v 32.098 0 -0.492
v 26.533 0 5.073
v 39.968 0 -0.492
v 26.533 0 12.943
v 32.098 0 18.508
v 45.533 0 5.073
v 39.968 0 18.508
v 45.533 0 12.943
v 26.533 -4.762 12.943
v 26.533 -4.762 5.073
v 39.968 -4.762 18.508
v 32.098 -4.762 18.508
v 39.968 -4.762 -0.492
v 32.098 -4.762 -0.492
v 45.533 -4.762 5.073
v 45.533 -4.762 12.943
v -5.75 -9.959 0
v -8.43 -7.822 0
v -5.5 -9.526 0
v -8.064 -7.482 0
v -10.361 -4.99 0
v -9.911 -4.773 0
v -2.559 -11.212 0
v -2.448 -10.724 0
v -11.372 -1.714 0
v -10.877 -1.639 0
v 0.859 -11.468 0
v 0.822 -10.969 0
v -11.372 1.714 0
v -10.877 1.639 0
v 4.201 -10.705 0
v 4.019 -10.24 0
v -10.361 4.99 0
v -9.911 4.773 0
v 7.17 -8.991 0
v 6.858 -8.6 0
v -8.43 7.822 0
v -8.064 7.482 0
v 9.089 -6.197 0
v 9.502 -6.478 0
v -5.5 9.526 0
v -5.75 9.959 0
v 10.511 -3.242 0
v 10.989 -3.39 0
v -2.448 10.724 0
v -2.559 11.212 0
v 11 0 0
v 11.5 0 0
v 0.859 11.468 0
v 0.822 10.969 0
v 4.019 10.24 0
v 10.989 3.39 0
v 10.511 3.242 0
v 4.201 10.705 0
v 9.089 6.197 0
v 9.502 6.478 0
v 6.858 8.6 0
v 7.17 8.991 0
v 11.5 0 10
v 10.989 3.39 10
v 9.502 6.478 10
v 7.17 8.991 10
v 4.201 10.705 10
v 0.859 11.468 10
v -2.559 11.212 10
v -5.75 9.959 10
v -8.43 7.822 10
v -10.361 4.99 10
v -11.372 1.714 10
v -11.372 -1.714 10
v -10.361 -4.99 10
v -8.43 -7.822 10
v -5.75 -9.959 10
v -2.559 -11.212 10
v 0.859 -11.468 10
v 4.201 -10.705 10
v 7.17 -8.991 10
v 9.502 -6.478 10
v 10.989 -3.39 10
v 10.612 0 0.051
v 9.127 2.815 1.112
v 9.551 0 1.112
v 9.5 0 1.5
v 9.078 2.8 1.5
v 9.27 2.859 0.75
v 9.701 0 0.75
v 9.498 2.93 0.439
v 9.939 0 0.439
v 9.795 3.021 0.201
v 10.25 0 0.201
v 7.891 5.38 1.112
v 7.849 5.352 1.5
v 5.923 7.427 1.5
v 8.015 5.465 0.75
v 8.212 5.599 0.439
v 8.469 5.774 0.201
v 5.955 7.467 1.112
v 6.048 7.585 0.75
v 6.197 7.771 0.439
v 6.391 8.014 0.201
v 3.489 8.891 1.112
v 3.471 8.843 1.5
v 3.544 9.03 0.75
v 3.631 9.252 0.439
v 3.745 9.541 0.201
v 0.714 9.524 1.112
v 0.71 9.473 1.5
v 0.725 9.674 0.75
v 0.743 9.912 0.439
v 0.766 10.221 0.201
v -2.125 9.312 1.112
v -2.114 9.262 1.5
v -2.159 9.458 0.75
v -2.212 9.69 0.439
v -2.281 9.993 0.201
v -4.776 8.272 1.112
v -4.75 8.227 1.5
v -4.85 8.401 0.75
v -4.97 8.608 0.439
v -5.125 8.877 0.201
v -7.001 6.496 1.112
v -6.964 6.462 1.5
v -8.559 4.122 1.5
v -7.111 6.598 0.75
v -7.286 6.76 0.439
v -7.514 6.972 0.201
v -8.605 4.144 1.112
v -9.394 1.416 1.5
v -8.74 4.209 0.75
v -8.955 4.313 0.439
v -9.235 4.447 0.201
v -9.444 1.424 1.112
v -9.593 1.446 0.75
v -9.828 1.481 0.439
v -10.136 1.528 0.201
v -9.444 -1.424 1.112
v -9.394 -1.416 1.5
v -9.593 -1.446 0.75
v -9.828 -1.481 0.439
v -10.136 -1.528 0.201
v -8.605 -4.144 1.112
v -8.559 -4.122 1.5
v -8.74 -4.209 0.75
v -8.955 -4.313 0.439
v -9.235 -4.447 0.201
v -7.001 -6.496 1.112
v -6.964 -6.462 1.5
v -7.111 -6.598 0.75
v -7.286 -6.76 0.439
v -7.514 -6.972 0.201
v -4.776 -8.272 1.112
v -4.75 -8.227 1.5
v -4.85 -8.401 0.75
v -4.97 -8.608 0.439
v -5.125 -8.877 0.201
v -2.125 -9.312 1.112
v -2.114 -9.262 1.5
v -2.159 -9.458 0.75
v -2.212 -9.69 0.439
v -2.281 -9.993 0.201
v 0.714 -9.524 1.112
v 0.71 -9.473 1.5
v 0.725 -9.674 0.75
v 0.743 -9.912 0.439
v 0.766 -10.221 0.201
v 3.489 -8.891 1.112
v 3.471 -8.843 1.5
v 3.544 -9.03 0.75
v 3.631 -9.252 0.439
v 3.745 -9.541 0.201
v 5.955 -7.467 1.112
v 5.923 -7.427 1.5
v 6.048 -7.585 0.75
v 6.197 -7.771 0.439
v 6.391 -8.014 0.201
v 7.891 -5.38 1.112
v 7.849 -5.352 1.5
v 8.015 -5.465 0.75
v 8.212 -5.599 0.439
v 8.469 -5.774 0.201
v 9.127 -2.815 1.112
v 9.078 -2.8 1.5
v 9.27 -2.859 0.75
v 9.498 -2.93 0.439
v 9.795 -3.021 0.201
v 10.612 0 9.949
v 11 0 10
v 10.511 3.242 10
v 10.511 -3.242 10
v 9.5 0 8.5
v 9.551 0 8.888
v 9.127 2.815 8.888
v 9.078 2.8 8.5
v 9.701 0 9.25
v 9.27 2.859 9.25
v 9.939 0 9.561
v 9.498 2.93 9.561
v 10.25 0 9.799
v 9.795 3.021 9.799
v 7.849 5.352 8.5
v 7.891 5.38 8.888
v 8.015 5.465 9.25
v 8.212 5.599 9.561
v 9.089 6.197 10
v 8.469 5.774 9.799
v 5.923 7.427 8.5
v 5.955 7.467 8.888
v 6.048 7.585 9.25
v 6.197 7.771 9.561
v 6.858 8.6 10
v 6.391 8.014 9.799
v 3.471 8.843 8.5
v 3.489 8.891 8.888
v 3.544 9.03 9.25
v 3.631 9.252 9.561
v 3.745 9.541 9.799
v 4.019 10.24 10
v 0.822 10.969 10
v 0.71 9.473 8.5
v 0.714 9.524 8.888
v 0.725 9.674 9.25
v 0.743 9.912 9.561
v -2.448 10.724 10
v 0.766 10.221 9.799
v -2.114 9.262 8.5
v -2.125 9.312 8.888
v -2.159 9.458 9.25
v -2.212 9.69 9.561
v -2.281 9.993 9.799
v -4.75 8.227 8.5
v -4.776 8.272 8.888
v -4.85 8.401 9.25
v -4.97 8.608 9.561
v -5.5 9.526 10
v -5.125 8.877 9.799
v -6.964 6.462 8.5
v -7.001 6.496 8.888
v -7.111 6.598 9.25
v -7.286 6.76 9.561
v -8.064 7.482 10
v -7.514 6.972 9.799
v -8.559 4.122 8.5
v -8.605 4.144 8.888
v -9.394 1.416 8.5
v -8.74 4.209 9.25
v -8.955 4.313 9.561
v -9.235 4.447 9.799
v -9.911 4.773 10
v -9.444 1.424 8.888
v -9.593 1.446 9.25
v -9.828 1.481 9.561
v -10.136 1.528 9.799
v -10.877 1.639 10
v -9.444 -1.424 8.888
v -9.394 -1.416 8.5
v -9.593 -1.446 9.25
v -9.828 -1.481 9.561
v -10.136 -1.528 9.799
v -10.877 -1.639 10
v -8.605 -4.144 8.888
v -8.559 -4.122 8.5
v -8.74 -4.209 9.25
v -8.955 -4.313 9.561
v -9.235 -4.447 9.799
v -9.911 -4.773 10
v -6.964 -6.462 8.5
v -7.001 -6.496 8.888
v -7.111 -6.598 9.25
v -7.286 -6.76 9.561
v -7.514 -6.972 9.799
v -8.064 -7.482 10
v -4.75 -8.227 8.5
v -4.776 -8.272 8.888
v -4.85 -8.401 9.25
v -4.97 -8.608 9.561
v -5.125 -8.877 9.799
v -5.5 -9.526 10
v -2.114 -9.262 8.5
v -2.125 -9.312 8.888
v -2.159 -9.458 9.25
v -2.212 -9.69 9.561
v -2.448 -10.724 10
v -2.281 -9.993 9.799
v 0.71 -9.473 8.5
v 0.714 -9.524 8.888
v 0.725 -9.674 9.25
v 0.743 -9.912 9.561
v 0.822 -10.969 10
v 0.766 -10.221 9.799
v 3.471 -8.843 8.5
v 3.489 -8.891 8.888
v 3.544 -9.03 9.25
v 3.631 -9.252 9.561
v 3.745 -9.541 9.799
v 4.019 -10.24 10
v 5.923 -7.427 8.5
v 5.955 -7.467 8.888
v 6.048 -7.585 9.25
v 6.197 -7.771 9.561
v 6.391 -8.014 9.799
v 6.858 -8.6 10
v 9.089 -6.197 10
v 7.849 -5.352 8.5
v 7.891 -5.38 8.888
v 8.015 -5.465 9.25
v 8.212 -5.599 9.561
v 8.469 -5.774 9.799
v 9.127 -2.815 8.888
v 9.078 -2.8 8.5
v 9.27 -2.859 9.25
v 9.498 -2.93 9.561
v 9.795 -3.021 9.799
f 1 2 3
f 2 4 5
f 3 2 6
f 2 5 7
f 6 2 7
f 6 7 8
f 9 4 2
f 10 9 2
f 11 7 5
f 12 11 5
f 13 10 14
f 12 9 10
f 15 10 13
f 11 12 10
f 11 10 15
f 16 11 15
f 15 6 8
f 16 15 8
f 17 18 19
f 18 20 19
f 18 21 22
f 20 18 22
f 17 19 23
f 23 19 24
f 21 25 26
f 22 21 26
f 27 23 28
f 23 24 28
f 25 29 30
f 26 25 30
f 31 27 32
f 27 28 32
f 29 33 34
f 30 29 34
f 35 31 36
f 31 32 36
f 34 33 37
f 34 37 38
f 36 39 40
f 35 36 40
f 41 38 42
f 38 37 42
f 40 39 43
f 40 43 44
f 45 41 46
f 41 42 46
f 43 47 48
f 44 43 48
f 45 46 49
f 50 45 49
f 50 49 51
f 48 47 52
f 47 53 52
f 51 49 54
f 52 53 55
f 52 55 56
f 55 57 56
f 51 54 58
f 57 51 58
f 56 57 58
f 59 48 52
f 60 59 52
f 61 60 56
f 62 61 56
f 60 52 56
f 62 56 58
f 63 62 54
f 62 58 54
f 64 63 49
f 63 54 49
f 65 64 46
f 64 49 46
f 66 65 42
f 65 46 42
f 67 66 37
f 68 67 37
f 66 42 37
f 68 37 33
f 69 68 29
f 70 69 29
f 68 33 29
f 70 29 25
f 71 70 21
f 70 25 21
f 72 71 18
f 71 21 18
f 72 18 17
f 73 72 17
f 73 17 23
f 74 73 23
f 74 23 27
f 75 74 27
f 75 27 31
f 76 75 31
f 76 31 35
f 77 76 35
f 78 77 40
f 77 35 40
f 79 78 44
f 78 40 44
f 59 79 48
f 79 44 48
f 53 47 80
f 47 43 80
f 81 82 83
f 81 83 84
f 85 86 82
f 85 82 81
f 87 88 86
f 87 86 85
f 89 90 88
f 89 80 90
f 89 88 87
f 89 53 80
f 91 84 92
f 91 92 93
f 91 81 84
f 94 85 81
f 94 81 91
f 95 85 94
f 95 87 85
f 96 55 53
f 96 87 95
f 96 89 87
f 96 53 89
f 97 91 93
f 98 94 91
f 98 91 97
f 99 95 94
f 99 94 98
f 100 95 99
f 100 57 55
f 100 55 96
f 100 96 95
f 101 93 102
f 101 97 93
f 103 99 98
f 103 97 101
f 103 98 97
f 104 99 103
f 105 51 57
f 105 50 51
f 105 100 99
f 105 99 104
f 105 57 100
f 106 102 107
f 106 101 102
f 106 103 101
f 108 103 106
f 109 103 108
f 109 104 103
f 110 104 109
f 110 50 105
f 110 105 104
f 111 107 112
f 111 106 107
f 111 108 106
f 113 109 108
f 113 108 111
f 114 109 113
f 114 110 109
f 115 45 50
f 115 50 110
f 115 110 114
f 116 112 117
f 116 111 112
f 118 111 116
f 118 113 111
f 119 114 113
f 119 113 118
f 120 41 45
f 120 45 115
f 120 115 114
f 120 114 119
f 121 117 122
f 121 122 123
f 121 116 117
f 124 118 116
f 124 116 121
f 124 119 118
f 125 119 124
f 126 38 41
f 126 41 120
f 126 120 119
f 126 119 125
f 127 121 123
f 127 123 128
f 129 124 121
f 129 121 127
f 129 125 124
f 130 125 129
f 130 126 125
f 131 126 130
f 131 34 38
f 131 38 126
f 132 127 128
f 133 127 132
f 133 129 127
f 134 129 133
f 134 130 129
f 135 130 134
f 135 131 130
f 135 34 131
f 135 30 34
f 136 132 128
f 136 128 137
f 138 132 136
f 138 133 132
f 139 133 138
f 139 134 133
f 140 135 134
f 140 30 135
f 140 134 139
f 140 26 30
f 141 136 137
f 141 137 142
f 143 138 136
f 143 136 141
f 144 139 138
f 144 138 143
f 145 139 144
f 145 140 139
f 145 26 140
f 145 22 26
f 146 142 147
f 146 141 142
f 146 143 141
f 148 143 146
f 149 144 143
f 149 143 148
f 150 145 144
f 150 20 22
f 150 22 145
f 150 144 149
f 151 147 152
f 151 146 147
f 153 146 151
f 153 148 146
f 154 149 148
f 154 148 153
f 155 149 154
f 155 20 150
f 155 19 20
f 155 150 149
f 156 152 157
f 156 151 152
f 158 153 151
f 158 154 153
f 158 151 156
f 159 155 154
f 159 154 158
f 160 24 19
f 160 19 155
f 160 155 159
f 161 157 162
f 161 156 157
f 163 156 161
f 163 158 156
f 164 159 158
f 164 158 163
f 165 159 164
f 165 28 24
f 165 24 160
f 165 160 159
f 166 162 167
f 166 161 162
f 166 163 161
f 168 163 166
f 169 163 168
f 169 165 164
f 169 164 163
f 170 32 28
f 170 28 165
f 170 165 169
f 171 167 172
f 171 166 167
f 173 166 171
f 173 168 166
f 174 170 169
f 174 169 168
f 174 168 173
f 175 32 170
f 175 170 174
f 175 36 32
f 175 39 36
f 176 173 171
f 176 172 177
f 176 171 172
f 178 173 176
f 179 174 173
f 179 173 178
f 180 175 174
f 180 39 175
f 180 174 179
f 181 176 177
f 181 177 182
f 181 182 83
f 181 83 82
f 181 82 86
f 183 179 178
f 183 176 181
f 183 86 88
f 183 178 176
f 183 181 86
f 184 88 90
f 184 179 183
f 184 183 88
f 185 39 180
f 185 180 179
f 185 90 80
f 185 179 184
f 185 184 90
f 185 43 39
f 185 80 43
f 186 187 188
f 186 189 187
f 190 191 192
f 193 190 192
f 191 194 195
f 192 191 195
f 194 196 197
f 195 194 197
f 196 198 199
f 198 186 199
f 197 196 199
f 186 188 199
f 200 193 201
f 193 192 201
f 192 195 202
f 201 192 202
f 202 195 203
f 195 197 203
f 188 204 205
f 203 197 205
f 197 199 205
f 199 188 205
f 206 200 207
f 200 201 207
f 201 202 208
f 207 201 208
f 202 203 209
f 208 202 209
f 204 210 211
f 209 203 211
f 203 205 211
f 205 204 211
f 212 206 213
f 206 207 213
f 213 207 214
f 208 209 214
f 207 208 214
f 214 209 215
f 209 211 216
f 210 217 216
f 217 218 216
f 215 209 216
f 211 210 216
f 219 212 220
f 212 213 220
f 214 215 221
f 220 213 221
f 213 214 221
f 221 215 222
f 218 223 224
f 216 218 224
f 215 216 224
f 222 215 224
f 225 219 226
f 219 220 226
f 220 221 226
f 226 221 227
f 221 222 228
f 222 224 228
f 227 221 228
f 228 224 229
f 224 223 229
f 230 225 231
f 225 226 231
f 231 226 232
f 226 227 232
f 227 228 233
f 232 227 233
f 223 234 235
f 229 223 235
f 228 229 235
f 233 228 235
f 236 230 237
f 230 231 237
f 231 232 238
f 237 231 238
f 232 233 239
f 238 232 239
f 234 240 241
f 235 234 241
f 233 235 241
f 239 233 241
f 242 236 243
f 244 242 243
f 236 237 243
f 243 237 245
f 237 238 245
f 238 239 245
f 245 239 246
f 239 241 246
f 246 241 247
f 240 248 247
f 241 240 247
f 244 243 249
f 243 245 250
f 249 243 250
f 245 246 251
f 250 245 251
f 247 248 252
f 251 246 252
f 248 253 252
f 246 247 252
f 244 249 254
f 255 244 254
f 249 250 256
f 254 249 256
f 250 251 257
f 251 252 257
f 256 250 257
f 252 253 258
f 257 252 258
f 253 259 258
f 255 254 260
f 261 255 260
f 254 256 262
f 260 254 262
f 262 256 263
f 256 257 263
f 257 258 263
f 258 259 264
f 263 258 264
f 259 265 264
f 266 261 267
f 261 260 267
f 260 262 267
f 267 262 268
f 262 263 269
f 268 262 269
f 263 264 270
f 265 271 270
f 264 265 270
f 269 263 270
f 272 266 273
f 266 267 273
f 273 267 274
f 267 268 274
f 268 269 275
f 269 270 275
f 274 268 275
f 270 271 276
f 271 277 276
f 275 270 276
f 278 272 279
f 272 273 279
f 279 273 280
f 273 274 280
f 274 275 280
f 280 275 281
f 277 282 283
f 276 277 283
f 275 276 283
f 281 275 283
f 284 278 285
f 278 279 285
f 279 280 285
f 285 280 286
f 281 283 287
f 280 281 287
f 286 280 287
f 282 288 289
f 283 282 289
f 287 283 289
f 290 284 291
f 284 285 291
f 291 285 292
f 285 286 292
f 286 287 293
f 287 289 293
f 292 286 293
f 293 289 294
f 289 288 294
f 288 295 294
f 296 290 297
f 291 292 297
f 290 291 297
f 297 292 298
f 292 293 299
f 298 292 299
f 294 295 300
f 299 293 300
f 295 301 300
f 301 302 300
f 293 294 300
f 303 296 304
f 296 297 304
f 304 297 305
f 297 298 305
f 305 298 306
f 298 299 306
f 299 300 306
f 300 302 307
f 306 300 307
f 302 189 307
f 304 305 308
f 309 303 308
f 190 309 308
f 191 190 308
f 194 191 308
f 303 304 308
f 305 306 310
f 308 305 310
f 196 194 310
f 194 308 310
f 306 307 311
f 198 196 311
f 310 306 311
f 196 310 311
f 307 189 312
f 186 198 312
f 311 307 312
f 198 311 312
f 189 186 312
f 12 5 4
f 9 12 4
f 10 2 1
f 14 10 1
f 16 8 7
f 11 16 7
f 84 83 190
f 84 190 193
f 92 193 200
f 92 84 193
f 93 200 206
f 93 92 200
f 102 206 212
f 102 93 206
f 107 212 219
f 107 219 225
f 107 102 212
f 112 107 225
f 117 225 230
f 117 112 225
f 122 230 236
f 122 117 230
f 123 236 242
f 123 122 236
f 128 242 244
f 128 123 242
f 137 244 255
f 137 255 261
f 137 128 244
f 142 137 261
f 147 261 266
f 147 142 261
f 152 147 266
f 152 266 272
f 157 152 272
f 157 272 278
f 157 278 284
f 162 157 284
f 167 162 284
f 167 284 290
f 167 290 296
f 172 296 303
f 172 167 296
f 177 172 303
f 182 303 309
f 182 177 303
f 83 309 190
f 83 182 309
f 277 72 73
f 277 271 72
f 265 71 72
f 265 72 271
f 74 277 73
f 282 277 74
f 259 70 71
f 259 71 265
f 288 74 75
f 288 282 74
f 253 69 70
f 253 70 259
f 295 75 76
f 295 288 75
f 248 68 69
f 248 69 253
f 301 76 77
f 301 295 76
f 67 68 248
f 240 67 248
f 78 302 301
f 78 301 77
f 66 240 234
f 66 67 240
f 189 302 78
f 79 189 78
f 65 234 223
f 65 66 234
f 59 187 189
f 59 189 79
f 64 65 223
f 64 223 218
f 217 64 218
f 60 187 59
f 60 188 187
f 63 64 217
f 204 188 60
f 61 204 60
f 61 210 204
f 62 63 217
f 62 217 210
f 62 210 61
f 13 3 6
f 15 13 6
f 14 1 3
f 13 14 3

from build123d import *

# Parameters (mm, degrees)
F0_R     = 11.5
F0_R_2   = 9.5
F1_DEPTH = 10
F2_R     = 1.5
F4_DEPTH = 4.762


with BuildPart() as f1:
    # F0 (on Top) → F1 (new body)
    with BuildSketch(Plane.XY):
        Circle(F0_R)
        Circle(F0_R_2, mode=Mode.SUBTRACT)
    extrude(amount=F1_DEPTH)

    # F2
    f2_edges = [f1.edges().sort_by_distance(p)[0] for p in [
        (-9.5, 0, 10),
        (-9.5, 0, 0),
    ]]
    fillet(f2_edges, radius=F2_R)


with BuildPart() as f4:
    # F3 (on Front) → F4 (new body)
    with BuildSketch(Plane.XZ):
        Polygon((39.968242, 18.508302), (32.098184, 18.508302), (26.533213, 12.943331), (26.533213, 5.073274), (32.098184, -0.491698), (39.968242, -0.491698), (45.533213, 5.073274), (45.533213, 12.943331), align=None)
    extrude(amount=F4_DEPTH)


solid = Compound([f1.part, f4.part])
